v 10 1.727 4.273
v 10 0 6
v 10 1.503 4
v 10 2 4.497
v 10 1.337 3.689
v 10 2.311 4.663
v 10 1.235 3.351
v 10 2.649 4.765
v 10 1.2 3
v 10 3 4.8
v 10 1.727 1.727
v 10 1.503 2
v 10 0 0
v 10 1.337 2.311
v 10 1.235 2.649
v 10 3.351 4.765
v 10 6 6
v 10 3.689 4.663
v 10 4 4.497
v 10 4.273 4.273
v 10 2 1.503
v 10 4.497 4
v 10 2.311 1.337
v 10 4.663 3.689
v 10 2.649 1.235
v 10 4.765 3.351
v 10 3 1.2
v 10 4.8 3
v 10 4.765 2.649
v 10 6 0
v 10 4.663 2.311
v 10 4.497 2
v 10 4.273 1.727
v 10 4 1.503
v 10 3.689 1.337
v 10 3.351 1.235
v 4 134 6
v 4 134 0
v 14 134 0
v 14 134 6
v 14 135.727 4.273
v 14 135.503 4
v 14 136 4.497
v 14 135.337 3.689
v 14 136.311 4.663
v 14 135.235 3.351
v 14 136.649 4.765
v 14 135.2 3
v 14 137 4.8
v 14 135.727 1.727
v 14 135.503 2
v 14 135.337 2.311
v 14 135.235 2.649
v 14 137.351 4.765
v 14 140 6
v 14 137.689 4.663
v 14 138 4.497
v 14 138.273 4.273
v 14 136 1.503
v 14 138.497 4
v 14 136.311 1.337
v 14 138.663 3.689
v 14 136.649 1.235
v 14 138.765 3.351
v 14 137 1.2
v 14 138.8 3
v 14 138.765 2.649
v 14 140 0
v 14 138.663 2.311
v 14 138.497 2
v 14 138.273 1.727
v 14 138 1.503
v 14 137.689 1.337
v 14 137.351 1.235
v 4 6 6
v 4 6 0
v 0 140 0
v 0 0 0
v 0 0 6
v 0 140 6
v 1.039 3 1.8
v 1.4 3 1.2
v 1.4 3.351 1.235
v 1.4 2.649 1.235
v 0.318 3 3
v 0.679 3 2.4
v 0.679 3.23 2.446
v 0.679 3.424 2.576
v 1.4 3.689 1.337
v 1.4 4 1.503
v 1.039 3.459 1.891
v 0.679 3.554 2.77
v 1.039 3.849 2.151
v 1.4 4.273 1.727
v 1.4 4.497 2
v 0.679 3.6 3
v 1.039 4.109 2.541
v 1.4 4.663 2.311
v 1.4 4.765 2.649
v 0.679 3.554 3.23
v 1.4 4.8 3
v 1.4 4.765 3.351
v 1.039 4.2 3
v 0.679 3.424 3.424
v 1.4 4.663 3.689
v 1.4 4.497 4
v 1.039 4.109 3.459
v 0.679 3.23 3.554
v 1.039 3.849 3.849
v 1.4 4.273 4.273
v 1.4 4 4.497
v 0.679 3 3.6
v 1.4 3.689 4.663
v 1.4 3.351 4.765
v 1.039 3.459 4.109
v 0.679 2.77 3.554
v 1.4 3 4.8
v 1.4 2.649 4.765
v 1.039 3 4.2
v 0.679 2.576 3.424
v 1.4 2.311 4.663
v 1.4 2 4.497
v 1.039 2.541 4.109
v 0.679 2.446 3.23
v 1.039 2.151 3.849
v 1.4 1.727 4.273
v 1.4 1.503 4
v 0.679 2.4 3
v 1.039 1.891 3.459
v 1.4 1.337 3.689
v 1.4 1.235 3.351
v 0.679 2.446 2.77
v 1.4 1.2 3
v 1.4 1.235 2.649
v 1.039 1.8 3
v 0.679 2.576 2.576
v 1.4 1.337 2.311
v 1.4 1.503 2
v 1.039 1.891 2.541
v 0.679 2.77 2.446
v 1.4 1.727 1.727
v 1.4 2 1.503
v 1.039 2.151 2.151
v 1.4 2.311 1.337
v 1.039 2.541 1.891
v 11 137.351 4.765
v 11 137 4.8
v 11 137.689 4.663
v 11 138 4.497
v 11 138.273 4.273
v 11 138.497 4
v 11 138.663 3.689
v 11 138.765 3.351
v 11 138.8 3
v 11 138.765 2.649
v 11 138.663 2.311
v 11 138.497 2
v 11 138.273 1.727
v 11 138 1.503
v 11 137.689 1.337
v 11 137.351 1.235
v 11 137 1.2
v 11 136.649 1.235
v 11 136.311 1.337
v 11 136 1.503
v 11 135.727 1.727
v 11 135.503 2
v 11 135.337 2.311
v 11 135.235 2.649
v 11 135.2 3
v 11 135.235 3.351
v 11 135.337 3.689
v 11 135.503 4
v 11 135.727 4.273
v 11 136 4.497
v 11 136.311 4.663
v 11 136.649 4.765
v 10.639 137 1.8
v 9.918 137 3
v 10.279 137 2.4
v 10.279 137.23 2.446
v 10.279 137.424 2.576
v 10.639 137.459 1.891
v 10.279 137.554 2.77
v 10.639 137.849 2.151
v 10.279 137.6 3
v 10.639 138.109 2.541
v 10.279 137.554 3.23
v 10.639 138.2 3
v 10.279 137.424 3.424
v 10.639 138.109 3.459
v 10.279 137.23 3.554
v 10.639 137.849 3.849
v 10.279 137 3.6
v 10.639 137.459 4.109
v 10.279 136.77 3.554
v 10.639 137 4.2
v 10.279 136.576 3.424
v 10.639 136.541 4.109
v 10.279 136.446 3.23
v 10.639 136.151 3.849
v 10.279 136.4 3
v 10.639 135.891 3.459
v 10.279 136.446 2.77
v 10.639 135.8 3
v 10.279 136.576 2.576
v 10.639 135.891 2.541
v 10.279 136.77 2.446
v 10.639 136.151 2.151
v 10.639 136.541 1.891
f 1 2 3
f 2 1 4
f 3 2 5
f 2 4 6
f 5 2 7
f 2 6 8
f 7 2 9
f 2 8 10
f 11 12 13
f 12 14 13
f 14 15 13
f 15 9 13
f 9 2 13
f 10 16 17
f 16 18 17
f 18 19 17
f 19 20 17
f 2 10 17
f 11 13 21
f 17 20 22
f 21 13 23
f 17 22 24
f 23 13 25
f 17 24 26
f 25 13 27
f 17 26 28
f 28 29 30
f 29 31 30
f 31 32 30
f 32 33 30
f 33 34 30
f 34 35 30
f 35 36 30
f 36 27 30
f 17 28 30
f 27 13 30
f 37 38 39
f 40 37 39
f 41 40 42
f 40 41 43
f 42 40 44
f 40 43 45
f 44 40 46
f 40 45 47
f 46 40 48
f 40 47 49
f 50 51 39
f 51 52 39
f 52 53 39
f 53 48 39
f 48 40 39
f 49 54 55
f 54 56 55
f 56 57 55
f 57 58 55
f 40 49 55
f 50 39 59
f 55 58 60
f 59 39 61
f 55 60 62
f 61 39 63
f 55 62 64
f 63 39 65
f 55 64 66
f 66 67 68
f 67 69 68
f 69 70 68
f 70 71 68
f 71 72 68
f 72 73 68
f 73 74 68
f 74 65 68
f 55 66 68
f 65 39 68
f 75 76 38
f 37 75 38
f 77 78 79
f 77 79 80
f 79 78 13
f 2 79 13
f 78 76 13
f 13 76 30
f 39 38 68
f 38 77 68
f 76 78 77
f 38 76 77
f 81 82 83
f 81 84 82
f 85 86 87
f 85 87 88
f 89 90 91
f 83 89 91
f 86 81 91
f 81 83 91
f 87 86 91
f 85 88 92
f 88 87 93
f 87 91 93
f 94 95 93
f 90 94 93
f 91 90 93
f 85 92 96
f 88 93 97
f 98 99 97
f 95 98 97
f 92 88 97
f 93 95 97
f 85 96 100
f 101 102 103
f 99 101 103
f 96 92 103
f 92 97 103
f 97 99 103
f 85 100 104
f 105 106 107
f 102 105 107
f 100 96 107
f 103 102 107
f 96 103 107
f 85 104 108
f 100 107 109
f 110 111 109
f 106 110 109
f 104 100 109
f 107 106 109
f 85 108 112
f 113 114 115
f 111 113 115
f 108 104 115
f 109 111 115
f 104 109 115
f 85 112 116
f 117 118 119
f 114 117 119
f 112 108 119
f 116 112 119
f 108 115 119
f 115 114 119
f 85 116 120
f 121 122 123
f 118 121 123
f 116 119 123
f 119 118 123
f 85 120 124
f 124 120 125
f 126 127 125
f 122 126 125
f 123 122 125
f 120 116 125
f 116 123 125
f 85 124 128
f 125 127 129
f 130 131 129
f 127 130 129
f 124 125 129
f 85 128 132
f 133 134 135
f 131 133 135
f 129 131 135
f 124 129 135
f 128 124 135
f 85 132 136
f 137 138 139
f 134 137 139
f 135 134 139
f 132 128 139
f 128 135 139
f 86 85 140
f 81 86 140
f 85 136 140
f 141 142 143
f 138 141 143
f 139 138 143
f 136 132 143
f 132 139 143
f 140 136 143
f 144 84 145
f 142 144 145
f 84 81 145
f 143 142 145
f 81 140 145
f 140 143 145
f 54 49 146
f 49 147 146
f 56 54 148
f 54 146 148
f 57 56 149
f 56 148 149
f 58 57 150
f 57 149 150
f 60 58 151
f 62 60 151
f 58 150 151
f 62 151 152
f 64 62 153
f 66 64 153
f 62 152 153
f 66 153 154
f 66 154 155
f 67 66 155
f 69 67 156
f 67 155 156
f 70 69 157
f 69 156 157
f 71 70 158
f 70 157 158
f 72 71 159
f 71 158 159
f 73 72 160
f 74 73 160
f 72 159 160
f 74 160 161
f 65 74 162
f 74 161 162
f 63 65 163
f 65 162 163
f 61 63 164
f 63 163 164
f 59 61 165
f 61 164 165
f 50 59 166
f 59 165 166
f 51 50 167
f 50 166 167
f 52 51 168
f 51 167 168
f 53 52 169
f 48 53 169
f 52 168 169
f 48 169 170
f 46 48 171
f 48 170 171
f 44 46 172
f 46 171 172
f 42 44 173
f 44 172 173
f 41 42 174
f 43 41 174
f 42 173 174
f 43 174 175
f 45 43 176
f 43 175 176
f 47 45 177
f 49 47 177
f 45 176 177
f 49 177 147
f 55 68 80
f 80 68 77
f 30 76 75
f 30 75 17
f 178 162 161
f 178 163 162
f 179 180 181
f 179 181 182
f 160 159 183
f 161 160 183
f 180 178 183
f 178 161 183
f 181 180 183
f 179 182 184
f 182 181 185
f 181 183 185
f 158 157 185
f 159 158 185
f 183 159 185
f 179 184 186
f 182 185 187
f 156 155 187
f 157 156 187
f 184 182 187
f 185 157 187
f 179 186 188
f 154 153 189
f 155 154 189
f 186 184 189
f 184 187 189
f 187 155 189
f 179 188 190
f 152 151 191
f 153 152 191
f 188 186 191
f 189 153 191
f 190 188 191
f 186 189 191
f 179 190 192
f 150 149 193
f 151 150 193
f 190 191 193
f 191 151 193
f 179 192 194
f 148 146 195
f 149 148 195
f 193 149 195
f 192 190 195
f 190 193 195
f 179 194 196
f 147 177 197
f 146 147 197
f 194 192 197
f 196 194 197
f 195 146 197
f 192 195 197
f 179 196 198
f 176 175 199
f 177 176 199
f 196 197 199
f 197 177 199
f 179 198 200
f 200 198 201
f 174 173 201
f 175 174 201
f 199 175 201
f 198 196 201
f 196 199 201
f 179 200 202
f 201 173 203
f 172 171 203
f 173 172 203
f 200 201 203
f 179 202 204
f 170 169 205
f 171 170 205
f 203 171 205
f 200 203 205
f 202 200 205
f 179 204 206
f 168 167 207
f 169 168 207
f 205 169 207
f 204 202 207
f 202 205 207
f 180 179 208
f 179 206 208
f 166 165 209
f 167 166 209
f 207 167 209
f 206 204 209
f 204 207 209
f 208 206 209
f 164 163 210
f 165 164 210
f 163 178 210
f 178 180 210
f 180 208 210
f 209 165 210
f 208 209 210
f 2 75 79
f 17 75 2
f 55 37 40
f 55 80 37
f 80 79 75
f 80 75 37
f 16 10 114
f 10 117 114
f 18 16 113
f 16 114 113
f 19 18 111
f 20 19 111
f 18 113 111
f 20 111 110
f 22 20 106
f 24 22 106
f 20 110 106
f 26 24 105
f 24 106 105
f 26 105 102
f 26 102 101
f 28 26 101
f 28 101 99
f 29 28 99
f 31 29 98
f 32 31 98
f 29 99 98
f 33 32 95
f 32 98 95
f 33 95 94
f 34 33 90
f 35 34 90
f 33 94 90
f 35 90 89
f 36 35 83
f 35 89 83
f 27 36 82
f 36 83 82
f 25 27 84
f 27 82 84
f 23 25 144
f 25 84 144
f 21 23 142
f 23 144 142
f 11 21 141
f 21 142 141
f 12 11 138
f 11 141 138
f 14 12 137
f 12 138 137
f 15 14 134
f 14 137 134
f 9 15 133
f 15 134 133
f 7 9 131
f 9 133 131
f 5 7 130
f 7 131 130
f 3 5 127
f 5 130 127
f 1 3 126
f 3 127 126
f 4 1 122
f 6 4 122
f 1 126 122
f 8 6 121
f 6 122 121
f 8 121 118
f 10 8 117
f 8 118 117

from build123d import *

# Parameters (mm, degrees)
CROQUIS1_W                       = 10
CROQUIS1_H                       = 6
CROQUIS1_W_2                     = 4
CROQUIS1_H_2                     = 140
CROQUIS1_W_3                     = 6
SALIENTE_EXTRUIR1_DEPTH          = 6
TALADRO_DE_MARGEN_PARA_M31_D     = 3.6
TALADRO_DE_MARGEN_PARA_M31_DEPTH = 3
TALADRO_DE_MARGEN_PARA_M31_TIP   = 1.081549114
TALADRO_DE_MARGEN_PARA_M32_D     = 3.6
TALADRO_DE_MARGEN_PARA_M32_DEPTH = 8.6
TALADRO_DE_MARGEN_PARA_M32_TIP   = 1.081549114


with BuildPart() as part:
    # Croquis1 → Saliente-Extruir1 (new body)
    with BuildSketch(Plane.XY):
        with Locations((9, 137)):
            Rectangle(CROQUIS1_W, CROQUIS1_H)
        with Locations((2, 70)):
            Rectangle(CROQUIS1_W_2, CROQUIS1_H_2)
        with Locations((7, 3)):
            Rectangle(CROQUIS1_W_3, CROQUIS1_H)
    extrude(amount=SALIENTE_EXTRUIR1_DEPTH)

    # Taladro de margen para M31
    with Locations(Plane(origin=(14, 0, 0), x_dir=(0, 0, -1), z_dir=(1, 0, 0))):
        with Locations((-3, 137)):
            Hole(TALADRO_DE_MARGEN_PARA_M31_D / 2, depth=TALADRO_DE_MARGEN_PARA_M31_DEPTH)
            with Locations((0, 0, -(TALADRO_DE_MARGEN_PARA_M31_DEPTH + TALADRO_DE_MARGEN_PARA_M31_TIP / 2))):  # 118° drill point
                Cone(0, TALADRO_DE_MARGEN_PARA_M31_D / 2, TALADRO_DE_MARGEN_PARA_M31_TIP, mode=Mode.SUBTRACT)

    # Taladro de margen para M32
    with Locations(Plane(origin=(10, 0, 0), x_dir=(0, 0, -1), z_dir=(1, 0, 0))):
        with Locations((-3, 3)):
            Hole(TALADRO_DE_MARGEN_PARA_M32_D / 2, depth=TALADRO_DE_MARGEN_PARA_M32_DEPTH)
            with Locations((0, 0, -(TALADRO_DE_MARGEN_PARA_M32_DEPTH + TALADRO_DE_MARGEN_PARA_M32_TIP / 2))):  # 118° drill point
                Cone(0, TALADRO_DE_MARGEN_PARA_M32_D / 2, TALADRO_DE_MARGEN_PARA_M32_TIP, mode=Mode.SUBTRACT)


solid = part.part
